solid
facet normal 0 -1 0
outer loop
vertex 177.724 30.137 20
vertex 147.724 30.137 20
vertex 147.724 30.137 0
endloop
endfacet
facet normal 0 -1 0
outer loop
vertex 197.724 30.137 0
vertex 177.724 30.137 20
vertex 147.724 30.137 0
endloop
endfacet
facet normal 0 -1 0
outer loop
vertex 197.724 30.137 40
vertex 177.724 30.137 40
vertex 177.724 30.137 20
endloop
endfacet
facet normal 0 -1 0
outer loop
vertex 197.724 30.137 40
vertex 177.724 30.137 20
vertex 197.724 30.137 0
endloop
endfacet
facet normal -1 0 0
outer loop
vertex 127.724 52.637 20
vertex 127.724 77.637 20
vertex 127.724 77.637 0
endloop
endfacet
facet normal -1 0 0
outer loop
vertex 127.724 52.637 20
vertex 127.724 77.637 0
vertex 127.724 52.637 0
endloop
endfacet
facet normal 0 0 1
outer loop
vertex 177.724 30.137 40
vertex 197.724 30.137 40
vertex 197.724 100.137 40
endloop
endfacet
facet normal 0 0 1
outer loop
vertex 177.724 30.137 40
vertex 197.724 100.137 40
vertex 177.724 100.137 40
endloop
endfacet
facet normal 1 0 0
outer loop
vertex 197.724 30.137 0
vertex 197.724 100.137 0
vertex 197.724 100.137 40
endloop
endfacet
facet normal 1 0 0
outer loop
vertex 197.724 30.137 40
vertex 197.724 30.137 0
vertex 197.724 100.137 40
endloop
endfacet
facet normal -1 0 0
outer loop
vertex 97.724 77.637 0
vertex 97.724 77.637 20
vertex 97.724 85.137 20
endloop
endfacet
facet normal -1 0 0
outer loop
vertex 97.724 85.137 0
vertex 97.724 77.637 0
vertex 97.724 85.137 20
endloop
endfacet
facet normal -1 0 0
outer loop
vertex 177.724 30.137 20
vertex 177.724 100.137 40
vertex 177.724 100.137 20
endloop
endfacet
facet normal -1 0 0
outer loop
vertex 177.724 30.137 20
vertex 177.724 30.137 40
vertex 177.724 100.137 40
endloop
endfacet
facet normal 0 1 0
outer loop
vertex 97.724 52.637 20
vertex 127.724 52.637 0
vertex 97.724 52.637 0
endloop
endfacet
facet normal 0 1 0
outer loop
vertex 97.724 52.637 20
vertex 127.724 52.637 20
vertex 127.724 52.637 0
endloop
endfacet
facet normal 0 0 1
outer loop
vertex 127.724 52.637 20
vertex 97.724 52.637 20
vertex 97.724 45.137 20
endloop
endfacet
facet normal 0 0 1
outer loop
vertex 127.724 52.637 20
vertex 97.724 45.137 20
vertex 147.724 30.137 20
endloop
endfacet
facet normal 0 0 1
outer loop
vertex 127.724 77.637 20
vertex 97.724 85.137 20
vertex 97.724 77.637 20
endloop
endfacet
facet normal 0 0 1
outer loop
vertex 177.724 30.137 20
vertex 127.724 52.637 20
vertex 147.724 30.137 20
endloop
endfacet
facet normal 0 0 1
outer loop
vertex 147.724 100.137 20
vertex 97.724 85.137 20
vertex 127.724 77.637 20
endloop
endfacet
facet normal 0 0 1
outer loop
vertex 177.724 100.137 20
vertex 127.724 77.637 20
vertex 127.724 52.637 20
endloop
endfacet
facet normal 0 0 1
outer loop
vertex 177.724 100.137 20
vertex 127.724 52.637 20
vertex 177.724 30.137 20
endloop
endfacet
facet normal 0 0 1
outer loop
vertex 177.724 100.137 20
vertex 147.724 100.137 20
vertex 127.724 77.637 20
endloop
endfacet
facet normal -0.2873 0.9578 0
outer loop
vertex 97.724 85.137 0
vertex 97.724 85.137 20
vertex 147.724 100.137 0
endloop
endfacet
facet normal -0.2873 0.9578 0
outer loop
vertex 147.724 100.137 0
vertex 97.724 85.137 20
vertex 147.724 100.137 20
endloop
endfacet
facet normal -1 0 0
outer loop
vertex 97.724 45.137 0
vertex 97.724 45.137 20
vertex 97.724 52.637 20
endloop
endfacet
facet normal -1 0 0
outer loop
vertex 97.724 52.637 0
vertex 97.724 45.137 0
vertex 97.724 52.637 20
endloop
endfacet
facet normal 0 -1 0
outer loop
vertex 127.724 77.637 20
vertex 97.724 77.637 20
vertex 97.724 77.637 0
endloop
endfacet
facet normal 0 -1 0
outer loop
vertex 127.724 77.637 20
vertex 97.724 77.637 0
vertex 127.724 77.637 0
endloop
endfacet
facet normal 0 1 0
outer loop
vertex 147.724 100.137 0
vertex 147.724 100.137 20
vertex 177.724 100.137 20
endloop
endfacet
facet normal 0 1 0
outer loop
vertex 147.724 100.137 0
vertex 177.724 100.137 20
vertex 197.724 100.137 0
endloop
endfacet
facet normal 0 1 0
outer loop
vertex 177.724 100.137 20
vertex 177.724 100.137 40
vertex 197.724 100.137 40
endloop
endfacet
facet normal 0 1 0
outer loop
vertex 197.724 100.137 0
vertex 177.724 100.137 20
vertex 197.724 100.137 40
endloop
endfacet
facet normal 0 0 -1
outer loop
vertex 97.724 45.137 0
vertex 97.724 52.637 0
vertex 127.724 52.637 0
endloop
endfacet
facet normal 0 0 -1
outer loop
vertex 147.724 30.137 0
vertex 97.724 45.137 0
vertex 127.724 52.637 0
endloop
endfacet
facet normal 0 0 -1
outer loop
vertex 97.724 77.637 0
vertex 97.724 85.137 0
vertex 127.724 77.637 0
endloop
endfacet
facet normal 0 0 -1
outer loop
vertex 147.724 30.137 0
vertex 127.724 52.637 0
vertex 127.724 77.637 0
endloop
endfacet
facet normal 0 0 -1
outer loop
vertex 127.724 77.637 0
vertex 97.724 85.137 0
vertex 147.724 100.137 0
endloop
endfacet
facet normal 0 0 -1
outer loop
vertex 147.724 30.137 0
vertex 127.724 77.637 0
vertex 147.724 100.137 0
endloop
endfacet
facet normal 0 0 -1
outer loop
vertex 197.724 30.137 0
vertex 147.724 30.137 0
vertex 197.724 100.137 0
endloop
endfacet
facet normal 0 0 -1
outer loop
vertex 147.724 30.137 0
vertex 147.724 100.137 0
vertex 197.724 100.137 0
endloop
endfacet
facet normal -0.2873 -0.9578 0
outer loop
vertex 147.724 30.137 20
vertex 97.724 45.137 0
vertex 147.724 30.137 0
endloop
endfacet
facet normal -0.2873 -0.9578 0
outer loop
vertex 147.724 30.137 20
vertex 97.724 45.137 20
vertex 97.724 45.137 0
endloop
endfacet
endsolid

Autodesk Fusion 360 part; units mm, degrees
sketch "Sketch1" plane through (0, 0, 0) normal (0, 0, 1) x (1, 0, 0)
  line L0 (97.7238, 100.1373) -> (197.7238, 100.1373)
  line L1 (197.7238, 100.1373) -> (197.7238, 30.1373)
  line L2 (197.7238, 30.1373) -> (97.7238, 30.1373)
  line L3 (97.7238, 30.1373) -> (97.7238, 100.1373)
  dimension "d1" = 70
  dimension "d2" = 100
extrude "Extrude1" add sketch "Sketch1" along normal blind 20
sketch "Sketch2" plane through (0, 0, 20) normal (0, 0, 1) x (-1, 0, 0)
  line L0 (-97.7238, -30.1373) -> (-197.7238, -30.1373)
  line L1 (-197.7238, -30.1373) -> (-197.7238, -100.1373)
  line L2 (-197.7238, -100.1373) -> (-97.7238, -100.1373)
  line L3 (-97.7238, -100.1373) -> (-97.7238, -30.1373)
  line L4 (-97.7238, -77.6373) -> (-127.7238, -77.6373)
  line L5 (-127.7238, -77.6373) -> (-127.7238, -52.6373)
  line L6 (-127.7238, -52.6373) -> (-97.7238, -52.6373)
  dimension "d5" = 22.5
  dimension "d6" = 22.5
  dimension "d7" = 25
  dimension "d8" = 30
  dimension "d9" = 25
extrude "Extrude2" cut sketch "Sketch2" against normal blind 27.453 contours L3 L4 L5 L6
sketch "Sketch3" plane through (0, 0, 20) normal (0, 0, 1) x (-1, 0, 0)
  line L0 (-127.7238, -52.6373) -> (-97.7238, -52.6373)
  line L1 (-97.7238, -52.6373) -> (-97.7238, -30.1373)
  line L2 (-97.7238, -30.1373) -> (-197.7238, -30.1373)
  line L3 (-197.7238, -30.1373) -> (-197.7238, -100.1373)
  line L4 (-197.7238, -100.1373) -> (-97.7238, -100.1373)
  line L5 (-97.7238, -100.1373) -> (-97.7238, -77.6373)
  line L6 (-97.7238, -77.6373) -> (-127.7238, -77.6373)
  line L7 (-127.7238, -77.6373) -> (-127.7238, -52.6373)
  line L8 (-97.7238, -52.6373) -> (-97.7238, -45.1373)
  line L9 (-97.7238, -77.6373) -> (-97.7238, -85.1373)
  line L10 (-147.7238, -30.1373) -> (-147.7238, -100.1373)
  line L11 (-97.7238, -85.1373) -> (-147.7238, -100.1373)
  line L12 (-97.7238, -45.1373) -> (-147.7238, -30.1373)
  dimension "d12" = 7.5
  dimension "d13" = 7.5
extrude "Extrude3" cut sketch "Sketch3" against normal blind 62.472 contours L1 L2 L12
extrude "Extrude4" cut sketch "Sketch3" against normal blind 73.462 contours L4 L5 L11
sketch "Sketch4" plane through (0, 30.1373, 0) normal (0, -1, 0) x (1, 0, 0)
  line L0 (147.7238, 20) -> (147.7238, 0)
  line L1 (147.7238, 0) -> (197.7238, 0)
  line L2 (197.7238, 0) -> (197.7238, 20)
  line L3 (197.7238, 20) -> (147.7238, 20)
  line L4 (197.7238, 20) -> (197.7238, 40)
  line L5 (197.7238, 40) -> (177.7238, 40)
  line L6 (177.7238, 40) -> (177.7238, 20)
  dimension "d18" = 20
  dimension "d19" = 20
extrude "Extrude5" add sketch "Sketch4" against normal blind 70 contours L3 L4 L5 L6
